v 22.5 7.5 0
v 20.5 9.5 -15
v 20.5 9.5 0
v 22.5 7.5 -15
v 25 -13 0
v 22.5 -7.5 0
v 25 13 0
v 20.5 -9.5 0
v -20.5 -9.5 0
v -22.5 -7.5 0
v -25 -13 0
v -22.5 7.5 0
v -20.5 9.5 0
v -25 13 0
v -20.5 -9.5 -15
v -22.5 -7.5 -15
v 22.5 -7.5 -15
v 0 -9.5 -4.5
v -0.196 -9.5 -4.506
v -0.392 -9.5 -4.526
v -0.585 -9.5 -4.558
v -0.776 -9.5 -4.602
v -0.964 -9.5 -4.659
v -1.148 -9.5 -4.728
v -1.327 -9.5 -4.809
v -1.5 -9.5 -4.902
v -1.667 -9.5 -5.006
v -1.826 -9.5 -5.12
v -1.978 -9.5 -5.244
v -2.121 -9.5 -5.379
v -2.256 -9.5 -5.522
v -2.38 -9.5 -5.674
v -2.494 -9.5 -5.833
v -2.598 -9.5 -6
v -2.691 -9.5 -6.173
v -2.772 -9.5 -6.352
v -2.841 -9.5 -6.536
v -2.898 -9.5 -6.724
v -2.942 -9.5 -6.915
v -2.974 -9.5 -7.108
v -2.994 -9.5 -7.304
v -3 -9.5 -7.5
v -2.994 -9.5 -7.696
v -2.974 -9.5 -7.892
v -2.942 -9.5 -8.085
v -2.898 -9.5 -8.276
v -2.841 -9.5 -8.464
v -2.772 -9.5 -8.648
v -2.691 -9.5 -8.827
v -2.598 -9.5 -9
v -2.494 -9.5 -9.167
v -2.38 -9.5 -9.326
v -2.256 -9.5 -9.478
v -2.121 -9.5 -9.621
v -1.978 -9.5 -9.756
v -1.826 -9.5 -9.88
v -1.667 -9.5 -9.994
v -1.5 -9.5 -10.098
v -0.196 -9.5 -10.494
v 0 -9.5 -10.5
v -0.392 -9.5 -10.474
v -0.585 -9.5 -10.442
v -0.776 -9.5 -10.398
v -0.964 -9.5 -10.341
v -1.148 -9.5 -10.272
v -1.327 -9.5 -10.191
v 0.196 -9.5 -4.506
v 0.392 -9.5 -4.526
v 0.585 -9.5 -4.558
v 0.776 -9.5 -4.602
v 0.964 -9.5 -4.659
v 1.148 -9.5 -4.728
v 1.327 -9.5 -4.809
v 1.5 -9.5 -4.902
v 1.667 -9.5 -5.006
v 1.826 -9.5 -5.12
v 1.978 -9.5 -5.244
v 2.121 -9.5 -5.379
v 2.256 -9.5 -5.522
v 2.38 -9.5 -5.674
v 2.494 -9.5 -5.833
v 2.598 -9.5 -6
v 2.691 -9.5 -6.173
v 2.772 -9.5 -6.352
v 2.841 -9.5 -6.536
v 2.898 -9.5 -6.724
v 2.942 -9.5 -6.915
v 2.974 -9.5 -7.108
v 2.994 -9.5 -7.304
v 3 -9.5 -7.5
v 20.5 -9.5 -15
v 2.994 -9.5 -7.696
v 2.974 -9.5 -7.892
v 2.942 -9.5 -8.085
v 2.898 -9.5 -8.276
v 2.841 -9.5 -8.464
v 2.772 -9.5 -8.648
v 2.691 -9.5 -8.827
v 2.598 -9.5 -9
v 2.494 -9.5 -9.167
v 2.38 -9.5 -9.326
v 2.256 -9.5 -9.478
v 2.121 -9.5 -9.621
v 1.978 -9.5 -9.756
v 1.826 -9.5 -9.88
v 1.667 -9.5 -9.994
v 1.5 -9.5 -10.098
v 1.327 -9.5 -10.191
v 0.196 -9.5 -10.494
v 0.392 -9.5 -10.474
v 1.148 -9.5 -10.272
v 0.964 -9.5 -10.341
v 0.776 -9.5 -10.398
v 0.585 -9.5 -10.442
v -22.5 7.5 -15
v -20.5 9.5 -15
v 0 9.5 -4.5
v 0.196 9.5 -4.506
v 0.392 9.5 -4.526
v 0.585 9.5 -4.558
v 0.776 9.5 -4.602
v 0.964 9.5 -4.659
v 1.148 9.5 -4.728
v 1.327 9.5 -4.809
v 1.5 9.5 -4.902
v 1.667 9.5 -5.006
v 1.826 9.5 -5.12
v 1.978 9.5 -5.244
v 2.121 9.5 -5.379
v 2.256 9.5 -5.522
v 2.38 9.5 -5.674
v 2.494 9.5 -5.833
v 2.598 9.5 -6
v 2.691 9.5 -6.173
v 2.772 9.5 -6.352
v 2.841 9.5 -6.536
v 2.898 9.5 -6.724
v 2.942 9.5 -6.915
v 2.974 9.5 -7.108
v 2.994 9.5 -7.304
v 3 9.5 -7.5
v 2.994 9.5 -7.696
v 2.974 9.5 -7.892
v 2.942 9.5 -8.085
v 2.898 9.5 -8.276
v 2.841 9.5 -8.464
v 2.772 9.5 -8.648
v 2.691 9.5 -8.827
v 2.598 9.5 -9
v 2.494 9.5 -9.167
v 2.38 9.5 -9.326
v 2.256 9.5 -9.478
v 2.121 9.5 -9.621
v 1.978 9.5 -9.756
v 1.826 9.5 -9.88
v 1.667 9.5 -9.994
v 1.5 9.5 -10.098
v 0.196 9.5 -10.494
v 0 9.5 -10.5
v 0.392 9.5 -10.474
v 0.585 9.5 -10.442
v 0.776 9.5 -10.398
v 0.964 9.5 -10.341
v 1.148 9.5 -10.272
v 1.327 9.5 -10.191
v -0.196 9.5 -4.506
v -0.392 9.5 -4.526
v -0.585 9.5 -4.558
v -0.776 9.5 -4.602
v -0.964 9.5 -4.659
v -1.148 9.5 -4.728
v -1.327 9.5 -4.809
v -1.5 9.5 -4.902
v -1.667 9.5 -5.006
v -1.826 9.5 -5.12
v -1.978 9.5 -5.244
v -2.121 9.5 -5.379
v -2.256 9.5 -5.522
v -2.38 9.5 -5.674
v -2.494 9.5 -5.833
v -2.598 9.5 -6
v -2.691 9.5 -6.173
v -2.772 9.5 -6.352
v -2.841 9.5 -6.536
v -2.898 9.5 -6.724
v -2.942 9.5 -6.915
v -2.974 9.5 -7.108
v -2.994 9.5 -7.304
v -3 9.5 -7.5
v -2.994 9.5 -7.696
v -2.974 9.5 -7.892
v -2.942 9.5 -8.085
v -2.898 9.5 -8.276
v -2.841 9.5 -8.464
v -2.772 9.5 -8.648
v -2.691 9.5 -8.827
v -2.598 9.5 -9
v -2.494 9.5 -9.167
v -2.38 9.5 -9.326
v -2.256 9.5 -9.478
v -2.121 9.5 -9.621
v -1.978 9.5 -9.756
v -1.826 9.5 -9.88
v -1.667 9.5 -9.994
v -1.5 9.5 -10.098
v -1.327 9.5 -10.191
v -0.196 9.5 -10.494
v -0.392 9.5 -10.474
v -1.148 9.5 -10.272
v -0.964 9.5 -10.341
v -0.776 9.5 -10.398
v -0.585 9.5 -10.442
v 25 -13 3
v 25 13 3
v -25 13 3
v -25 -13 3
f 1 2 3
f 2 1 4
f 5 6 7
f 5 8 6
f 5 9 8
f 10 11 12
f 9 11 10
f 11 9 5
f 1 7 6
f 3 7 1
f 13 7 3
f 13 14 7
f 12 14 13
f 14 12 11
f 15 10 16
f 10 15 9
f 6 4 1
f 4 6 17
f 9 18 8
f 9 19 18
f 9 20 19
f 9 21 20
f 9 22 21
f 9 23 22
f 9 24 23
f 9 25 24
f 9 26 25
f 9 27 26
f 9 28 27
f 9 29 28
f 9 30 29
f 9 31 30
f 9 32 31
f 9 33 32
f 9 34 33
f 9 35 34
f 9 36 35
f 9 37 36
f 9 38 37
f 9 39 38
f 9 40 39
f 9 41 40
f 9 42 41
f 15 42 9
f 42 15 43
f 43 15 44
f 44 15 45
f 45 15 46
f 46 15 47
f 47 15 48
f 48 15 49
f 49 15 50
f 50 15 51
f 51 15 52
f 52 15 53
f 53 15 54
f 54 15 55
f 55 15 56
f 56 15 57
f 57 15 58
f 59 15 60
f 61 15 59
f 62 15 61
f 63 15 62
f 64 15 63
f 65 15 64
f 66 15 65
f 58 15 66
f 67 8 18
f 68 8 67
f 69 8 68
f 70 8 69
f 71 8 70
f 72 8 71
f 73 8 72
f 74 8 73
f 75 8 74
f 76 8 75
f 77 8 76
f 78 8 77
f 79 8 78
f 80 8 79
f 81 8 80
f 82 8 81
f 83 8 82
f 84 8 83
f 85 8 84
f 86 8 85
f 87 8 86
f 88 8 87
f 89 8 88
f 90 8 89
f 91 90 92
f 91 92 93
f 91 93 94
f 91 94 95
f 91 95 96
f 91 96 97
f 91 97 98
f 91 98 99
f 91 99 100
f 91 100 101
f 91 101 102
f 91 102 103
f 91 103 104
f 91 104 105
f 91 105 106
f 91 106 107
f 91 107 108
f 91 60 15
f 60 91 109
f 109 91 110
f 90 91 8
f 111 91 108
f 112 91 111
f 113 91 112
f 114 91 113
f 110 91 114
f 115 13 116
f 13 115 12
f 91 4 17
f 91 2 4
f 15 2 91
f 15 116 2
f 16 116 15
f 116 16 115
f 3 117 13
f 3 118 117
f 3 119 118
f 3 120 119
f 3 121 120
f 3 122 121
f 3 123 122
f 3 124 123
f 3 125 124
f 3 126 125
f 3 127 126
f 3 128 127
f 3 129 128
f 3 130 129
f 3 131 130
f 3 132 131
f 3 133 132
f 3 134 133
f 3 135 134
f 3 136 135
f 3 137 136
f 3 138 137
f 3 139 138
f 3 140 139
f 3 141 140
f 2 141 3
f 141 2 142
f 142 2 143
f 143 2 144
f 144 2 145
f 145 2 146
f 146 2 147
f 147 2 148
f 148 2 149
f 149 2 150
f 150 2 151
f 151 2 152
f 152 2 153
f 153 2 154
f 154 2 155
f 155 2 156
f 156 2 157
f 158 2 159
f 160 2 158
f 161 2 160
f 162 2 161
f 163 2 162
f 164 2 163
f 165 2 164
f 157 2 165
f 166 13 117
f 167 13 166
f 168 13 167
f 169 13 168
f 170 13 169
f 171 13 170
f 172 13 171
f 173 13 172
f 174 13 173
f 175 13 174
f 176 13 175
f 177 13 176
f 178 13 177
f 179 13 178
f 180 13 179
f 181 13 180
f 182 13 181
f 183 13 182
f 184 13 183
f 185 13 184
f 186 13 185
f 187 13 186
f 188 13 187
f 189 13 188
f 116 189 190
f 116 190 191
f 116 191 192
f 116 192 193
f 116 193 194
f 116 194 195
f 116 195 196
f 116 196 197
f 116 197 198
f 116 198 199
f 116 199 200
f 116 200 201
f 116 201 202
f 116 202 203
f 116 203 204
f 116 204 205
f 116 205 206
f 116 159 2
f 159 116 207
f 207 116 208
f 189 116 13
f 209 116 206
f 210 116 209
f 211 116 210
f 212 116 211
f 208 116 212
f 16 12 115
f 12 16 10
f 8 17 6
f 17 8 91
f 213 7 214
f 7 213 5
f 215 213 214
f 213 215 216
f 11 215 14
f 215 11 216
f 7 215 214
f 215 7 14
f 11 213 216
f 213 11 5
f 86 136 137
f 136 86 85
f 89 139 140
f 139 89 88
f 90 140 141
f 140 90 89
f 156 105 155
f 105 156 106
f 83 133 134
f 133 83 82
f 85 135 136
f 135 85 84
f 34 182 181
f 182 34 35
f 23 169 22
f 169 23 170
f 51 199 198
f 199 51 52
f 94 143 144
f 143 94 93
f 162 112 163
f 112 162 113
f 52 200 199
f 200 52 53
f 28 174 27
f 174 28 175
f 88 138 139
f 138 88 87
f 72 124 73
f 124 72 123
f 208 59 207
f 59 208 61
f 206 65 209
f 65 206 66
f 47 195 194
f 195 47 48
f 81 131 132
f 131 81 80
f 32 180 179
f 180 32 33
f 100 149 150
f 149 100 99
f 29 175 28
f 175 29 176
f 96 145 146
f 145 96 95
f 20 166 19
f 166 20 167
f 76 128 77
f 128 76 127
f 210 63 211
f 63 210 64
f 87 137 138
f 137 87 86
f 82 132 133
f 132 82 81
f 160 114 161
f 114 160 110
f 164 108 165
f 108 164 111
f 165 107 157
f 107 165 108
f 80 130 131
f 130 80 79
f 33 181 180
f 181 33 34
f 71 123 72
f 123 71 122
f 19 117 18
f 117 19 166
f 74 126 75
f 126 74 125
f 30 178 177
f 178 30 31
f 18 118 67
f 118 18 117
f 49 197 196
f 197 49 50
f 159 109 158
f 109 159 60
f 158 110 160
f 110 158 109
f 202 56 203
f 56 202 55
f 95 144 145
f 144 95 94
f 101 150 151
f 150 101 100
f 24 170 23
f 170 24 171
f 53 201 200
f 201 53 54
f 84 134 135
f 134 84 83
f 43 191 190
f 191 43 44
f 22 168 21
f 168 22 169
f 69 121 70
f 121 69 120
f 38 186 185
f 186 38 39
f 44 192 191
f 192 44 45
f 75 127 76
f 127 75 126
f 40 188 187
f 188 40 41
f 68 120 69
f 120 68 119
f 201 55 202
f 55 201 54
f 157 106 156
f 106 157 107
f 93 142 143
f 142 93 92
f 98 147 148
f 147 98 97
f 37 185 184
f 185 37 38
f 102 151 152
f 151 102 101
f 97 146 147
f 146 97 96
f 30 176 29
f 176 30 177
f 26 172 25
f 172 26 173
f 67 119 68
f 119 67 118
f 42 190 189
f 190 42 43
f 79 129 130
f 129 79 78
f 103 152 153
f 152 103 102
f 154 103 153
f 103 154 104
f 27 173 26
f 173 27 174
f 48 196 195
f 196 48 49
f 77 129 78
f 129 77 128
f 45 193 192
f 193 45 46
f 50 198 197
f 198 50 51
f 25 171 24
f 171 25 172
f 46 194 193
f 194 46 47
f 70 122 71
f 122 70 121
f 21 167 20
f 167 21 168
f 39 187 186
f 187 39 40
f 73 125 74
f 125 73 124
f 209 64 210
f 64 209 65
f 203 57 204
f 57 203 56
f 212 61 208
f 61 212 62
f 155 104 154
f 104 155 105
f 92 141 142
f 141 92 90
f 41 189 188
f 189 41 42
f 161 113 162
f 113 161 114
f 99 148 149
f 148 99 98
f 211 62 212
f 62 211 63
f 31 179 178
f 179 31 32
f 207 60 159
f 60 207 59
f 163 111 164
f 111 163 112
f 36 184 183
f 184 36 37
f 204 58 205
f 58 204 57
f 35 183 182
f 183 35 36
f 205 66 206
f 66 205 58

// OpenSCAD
// file: lib/util.scad
// Small utilities to keep parts readable.

module centered_cylinder(d, h) {
  translate([0, 0, -h / 2]) cylinder(d = d, h = h, $fn = 96);
}
// file: parts/dtv_yagi_insert_poc.scad
include <../lib/util.scad>;

// Mechanical proof-of-concept for a DirecTV-style replacement arm insert.
//
// Geometry:
// - Insert body: 45mm x 19mm x 15mm with beveled cross-section corners.
// - Outside pad: 50mm x 26mm x 3mm.
// - Screw hole: centered, vertical, 6mm diameter through insert section.
//
// Coordinate convention for this part:
// - Tube face is at z=0.
// - Insert extends into the tube toward negative z.
// - Outside pad extends toward positive z.

module beveled_rect_prism(w, h, d, b) {
  wb = w / 2;
  hb = h / 2;
  bb = min(b, min(w, h) / 2 - 0.01);

  linear_extrude(height = d, center = false)
    polygon(points = [
      [-wb + bb, -hb],
      [ wb - bb, -hb],
      [ wb, -hb + bb],
      [ wb,  hb - bb],
      [ wb - bb,  hb],
      [-wb + bb,  hb],
      [-wb,  hb - bb],
      [-wb, -hb + bb]
    ]);
}

module dtv_yagi_insert_poc() {
  assert(insert_width > 0, "insert_width must be > 0");
  assert(insert_height > 0, "insert_height must be > 0");
  assert(insert_depth > 0, "insert_depth must be > 0");
  assert(outer_width > 0, "outer_width must be > 0");
  assert(outer_height > 0, "outer_height must be > 0");
  assert(outer_thickness > 0, "outer_thickness must be > 0");
  assert(screw_hole_d > 0, "screw_hole_d must be > 0");
  assert(insert_corner_bevel >= 0, "insert_corner_bevel must be >= 0");
  assert(insert_corner_bevel < min(insert_width, insert_height) / 2,
    "insert_corner_bevel must be less than half of insert width/height");

  difference() {
    union() {
      // Insert segment that slides into the tube.
      translate([0, 0, -insert_depth])
        beveled_rect_prism(insert_width, insert_height, insert_depth, insert_corner_bevel);

      // Outside pad for future arm/card integration.
      translate([-outer_width / 2, -outer_height / 2, 0])
        cube([outer_width, outer_height, outer_thickness], center = false);
    }

    // Centered vertical mounting hole through the insert segment.
    translate([0, 0, -insert_depth / 2])
      rotate([90, 0, 0])
      centered_cylinder(screw_hole_d, max(insert_height, outer_height) + 2);
  }
}
// file: lib/defaults.scad
// Project defaults (all dimensions in mm)

// Part selector (set via -D part_id=0/1/2...)
// NOTE: OpenSCAD CLI `-D` string quoting on Windows is fragile; use numeric ids.
part_id = 0; // 0=dtv_yagi_insert_poc

// Insert section (fits inside the square tube)
insert_width = 45;
insert_height = 19;
insert_depth = 15;
insert_corner_bevel = 2;

// Outside mounting pad (in front of the tube)
outer_width = 50;
outer_height = 26;
outer_thickness = 3;

// Centered vertical screw hole through the insert section
screw_hole_d = 6;
// main file
// Entry point for scripted exports.
// Usage:
//   openscad -o out.stl cad/designs/dtv_yagi/src/main.scad -D part_id=0 ...

include <lib/defaults.scad>;
include <parts/dtv_yagi_insert_poc.scad>;

_part_id = is_undef(part_id) ? 0 : part_id;

if (_part_id == 0) {
  dtv_yagi_insert_poc();
} else {
  assert(false, str("Unknown part_id: ", _part_id));
}
